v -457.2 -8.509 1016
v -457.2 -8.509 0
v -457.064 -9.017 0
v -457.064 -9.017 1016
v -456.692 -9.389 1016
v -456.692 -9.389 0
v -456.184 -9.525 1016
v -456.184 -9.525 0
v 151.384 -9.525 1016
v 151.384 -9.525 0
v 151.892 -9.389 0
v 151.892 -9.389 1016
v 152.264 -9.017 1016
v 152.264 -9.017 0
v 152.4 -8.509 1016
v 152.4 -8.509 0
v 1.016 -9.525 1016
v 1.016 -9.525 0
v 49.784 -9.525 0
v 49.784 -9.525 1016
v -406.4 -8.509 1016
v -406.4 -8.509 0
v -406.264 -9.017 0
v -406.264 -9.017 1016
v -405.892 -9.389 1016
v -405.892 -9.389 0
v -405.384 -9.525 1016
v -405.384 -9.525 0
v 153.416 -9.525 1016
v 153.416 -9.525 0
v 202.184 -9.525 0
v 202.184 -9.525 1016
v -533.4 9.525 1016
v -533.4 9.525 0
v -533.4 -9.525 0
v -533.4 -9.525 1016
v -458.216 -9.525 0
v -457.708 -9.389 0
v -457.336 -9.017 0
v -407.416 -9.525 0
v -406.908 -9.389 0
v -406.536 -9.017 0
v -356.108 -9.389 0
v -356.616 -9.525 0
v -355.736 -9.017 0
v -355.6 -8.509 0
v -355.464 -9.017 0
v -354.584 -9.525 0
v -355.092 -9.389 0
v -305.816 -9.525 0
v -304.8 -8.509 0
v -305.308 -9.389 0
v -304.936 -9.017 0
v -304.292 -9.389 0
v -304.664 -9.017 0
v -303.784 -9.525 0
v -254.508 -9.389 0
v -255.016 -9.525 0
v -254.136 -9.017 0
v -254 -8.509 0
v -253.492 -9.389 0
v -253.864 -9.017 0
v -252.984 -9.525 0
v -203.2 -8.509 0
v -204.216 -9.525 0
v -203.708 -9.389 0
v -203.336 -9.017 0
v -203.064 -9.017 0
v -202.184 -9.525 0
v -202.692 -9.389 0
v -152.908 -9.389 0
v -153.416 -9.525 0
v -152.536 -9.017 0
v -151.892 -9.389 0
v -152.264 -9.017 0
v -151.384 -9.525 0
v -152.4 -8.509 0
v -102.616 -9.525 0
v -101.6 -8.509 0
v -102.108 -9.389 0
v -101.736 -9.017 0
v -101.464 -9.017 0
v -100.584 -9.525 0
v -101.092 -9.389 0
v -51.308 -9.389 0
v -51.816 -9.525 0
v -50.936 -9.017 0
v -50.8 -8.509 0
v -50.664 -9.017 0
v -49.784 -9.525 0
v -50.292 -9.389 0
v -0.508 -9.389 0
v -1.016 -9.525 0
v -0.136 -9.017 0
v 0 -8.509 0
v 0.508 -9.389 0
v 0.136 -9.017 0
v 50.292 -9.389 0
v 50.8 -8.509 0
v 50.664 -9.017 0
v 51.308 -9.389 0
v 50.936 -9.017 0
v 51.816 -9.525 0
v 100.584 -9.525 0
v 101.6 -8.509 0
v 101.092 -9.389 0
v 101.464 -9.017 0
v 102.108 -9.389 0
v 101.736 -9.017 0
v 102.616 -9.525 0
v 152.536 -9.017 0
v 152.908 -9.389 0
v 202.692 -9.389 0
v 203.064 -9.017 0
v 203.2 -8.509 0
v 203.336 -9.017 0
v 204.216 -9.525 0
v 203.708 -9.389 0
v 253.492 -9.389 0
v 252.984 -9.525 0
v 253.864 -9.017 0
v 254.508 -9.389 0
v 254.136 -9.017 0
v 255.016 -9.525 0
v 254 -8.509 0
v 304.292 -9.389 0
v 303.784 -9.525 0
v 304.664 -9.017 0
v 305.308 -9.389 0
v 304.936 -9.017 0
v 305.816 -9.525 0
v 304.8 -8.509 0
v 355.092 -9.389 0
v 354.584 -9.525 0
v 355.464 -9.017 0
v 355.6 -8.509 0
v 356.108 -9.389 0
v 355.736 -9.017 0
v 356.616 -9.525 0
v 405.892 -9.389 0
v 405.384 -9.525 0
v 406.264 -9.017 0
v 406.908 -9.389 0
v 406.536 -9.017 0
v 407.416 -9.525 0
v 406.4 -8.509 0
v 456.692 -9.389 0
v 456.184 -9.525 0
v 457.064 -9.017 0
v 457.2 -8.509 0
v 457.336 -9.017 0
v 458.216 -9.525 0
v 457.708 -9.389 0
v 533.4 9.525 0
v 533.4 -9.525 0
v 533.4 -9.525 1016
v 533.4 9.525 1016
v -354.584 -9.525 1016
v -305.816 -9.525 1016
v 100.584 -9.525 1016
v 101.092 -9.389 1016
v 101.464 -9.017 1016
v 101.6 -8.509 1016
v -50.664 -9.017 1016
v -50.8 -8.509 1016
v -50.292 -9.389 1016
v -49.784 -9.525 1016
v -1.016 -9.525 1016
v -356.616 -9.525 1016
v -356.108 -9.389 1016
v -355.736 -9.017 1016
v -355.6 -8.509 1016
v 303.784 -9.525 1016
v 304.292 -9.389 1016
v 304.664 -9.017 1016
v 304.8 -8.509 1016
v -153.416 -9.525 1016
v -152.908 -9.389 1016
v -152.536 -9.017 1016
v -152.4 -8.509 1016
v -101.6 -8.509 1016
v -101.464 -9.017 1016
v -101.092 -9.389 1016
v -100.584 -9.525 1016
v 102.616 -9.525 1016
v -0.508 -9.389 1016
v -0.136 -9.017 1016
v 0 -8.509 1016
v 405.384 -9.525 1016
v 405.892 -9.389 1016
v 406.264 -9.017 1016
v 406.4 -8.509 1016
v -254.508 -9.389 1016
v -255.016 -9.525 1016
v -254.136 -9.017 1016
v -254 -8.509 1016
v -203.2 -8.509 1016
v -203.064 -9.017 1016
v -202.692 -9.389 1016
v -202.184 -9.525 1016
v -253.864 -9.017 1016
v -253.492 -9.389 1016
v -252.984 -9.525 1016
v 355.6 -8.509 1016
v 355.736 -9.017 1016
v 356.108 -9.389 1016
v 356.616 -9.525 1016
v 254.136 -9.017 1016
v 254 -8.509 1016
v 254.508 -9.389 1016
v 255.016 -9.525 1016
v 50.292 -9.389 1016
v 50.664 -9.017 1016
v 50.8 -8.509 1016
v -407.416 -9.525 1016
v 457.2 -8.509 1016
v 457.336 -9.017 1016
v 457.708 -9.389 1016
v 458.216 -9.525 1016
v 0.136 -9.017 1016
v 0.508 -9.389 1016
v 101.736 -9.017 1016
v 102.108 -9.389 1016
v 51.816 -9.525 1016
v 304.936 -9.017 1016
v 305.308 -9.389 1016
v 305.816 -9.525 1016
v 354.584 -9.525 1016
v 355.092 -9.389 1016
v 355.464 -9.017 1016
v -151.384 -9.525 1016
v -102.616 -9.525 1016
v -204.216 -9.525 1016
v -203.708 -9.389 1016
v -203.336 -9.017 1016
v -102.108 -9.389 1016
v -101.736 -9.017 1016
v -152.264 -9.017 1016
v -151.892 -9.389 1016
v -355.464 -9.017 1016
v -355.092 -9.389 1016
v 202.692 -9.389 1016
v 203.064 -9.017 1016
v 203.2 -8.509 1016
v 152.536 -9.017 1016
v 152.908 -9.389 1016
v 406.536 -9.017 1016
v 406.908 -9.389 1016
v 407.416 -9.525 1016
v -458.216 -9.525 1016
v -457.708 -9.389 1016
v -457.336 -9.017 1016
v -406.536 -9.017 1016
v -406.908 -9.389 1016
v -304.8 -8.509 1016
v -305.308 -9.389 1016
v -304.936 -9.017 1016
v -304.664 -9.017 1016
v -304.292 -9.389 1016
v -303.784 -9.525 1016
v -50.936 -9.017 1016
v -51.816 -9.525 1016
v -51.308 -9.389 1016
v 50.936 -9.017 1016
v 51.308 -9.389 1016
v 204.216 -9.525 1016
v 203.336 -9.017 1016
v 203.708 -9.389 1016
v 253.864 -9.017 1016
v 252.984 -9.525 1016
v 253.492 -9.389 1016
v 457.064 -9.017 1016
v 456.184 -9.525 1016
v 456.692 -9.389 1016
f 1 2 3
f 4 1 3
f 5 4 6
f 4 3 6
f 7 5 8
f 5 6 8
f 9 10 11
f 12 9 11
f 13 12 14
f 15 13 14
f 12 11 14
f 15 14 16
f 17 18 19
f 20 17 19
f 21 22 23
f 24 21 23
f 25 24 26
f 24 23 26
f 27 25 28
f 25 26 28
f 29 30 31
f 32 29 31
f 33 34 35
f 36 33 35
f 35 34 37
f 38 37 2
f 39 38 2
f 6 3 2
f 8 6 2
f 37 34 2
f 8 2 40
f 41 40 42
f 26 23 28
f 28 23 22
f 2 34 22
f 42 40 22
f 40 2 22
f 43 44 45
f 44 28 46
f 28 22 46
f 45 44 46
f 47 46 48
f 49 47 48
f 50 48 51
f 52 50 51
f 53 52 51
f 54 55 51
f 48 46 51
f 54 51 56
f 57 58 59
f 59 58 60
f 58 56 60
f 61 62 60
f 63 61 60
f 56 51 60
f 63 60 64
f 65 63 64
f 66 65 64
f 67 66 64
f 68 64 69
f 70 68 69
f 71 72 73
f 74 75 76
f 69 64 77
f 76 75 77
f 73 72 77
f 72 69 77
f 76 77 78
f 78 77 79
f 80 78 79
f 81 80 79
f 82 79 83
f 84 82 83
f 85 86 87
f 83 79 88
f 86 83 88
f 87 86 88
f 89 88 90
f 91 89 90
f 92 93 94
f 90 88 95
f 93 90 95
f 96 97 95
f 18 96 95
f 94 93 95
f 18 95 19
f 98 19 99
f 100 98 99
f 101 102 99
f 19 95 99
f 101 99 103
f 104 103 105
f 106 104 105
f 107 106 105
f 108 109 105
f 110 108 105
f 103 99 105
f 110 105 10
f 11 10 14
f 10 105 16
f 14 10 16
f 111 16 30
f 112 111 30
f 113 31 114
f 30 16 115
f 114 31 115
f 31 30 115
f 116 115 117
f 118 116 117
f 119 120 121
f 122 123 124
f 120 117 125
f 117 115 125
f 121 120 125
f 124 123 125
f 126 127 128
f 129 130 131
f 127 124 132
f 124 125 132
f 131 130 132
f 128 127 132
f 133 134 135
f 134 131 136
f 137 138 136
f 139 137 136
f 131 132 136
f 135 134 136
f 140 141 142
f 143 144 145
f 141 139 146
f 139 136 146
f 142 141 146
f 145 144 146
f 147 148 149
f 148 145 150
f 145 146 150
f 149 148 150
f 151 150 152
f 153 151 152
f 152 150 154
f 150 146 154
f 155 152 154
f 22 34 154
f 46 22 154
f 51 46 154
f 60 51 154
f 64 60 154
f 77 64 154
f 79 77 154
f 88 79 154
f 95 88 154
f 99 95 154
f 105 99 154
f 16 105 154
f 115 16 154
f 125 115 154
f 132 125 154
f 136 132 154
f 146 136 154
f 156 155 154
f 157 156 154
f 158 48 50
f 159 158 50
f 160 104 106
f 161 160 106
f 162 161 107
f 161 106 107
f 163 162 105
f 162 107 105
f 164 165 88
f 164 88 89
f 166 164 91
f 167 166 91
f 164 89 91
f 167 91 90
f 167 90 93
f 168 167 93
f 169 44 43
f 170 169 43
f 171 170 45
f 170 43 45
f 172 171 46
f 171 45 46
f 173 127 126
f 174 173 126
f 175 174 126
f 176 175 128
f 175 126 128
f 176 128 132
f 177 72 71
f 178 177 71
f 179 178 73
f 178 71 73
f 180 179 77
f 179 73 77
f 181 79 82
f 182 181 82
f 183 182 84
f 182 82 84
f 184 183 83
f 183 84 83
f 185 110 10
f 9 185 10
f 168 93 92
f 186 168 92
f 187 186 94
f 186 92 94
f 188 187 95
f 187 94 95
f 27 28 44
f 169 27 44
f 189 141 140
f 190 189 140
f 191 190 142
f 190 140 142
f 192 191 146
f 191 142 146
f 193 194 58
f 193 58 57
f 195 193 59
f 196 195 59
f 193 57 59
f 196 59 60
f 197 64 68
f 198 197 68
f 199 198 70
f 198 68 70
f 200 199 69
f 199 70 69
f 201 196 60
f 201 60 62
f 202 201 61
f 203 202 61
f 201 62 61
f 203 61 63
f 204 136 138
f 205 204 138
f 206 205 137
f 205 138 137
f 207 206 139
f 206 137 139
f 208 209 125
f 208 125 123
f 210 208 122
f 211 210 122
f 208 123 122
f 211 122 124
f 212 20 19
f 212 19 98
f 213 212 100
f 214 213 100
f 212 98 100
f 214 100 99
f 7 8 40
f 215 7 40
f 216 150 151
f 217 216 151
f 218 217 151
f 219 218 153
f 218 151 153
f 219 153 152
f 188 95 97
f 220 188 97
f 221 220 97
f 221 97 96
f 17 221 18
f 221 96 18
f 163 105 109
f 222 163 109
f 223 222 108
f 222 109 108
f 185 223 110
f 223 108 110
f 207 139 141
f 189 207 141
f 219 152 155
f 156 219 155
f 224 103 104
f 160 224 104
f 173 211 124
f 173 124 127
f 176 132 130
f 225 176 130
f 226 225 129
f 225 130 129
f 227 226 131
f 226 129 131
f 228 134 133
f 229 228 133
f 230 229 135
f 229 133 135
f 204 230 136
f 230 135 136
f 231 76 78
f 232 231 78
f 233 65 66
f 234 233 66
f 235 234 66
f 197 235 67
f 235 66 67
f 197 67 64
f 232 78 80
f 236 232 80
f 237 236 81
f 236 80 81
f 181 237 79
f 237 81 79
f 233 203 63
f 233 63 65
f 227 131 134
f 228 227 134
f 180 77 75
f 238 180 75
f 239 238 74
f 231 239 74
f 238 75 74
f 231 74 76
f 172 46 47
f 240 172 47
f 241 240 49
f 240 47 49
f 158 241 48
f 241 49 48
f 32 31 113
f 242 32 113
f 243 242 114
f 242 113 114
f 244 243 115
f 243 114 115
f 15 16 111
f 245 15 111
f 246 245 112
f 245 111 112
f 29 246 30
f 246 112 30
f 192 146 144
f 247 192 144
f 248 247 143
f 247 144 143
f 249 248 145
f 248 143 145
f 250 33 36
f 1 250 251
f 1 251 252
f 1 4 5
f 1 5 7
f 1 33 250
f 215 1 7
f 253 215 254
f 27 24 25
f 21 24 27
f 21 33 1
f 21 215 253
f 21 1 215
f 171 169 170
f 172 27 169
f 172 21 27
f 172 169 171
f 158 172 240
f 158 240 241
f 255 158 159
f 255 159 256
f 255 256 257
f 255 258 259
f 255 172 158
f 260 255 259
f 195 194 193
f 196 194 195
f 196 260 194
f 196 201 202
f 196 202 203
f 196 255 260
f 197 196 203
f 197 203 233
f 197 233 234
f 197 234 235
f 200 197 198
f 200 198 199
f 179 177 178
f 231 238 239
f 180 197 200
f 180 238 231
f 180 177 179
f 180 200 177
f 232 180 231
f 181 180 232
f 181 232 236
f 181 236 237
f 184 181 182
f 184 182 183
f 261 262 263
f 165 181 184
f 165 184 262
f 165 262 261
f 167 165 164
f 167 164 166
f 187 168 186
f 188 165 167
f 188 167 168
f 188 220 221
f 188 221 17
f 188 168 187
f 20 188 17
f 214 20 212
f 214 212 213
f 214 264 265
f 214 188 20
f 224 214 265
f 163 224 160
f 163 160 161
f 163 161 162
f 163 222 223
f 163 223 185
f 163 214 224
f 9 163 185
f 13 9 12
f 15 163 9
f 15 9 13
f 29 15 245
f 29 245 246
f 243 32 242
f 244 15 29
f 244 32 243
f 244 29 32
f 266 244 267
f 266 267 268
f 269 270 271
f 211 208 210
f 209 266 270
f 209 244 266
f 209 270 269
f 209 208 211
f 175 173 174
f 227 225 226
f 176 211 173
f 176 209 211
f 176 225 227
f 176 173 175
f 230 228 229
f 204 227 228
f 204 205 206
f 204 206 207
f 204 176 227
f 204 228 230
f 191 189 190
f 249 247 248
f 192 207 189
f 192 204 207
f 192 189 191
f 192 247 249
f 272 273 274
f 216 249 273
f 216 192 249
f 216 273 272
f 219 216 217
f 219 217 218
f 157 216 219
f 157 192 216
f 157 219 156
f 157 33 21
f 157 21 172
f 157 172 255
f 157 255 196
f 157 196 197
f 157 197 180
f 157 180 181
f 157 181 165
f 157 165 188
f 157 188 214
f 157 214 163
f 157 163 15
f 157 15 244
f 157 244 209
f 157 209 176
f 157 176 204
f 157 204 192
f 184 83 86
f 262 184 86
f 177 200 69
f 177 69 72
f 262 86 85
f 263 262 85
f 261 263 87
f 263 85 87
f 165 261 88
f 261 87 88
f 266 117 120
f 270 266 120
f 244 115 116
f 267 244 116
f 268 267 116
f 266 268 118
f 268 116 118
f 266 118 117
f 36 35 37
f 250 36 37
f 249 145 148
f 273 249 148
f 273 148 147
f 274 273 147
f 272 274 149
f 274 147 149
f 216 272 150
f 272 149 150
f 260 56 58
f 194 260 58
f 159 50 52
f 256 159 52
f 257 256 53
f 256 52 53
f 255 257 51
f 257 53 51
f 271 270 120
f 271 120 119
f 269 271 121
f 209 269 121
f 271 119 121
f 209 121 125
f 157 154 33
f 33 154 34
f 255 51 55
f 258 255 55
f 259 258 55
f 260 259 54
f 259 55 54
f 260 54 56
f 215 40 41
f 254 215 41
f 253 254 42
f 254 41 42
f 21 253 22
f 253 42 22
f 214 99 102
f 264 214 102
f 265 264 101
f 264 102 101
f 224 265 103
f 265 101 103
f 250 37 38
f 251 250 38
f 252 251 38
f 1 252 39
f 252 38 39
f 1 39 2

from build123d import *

# Parameters (mm, degrees)
F1_DEPTH = 1016


with BuildPart() as f1:
    # F0 (on Top) → F1 (new body)
    with BuildSketch(Plane.XY):
        with BuildLine():
            Line((509.016, -9.525), (533.4, -9.525))
            Line((533.4, -9.525), (533.4, 9.525))
            Line((533.4, 9.525), (-533.4, 9.525))
            Line((-533.4, 9.525), (-533.4, -9.525))
            Line((-533.4, -9.525), (-509.016, -9.525))
            ThreePointArc((-509.016, -9.525), (-508.29758, -9.22742), (-508, -8.509))
            ThreePointArc((-508, -8.509), (-507.70242, -9.22742), (-506.984, -9.525))
            Line((-506.984, -9.525), (-458.216, -9.525))
            ThreePointArc((-458.216, -9.525), (-457.49758, -9.22742), (-457.2, -8.509))
            ThreePointArc((-457.2, -8.509), (-456.90242, -9.22742), (-456.184, -9.525))
            Line((-456.184, -9.525), (-407.416, -9.525))
            ThreePointArc((-407.416, -9.525), (-406.69758, -9.22742), (-406.4, -8.509))
            ThreePointArc((-406.4, -8.509), (-406.10242, -9.22742), (-405.384, -9.525))
            Line((-405.384, -9.525), (-356.616, -9.525))
            ThreePointArc((-356.616, -9.525), (-355.89758, -9.22742), (-355.6, -8.509))
            ThreePointArc((-355.6, -8.509), (-355.30242, -9.22742), (-354.584, -9.525))
            Line((-354.584, -9.525), (-305.816, -9.525))
            ThreePointArc((-305.816, -9.525), (-305.09758, -9.22742), (-304.8, -8.509))
            ThreePointArc((-304.8, -8.509), (-304.50242, -9.22742), (-303.784, -9.525))
            Line((-303.784, -9.525), (-255.016, -9.525))
            ThreePointArc((-255.016, -9.525), (-254.29758, -9.22742), (-254, -8.509))
            ThreePointArc((-254, -8.509), (-253.70242, -9.22742), (-252.984, -9.525))
            Line((-252.984, -9.525), (-204.216, -9.525))
            ThreePointArc((-204.216, -9.525), (-203.49758, -9.22742), (-203.2, -8.509))
            ThreePointArc((-203.2, -8.509), (-202.90242, -9.22742), (-202.184, -9.525))
            Line((-202.184, -9.525), (-153.416, -9.525))
            ThreePointArc((-153.416, -9.525), (-152.69758, -9.22742), (-152.4, -8.509))
            ThreePointArc((-152.4, -8.509), (-152.10242, -9.22742), (-151.384, -9.525))
            Line((-151.384, -9.525), (-102.616, -9.525))
            ThreePointArc((-102.616, -9.525), (-101.89758, -9.22742), (-101.6, -8.509))
            ThreePointArc((-101.6, -8.509), (-101.30242, -9.22742), (-100.584, -9.525))
            Line((-100.584, -9.525), (-51.816, -9.525))
            ThreePointArc((-51.816, -9.525), (-51.09758, -9.22742), (-50.8, -8.509))
            ThreePointArc((-50.8, -8.509), (-50.50242, -9.22742), (-49.784, -9.525))
            Line((-49.784, -9.525), (-1.016, -9.525))
            ThreePointArc((-1.016, -9.525), (-0.29758, -9.22742), (0, -8.509))
            ThreePointArc((0, -8.509), (0.29758, -9.22742), (1.016, -9.525))
            Line((1.016, -9.525), (49.784, -9.525))
            ThreePointArc((49.784, -9.525), (50.50242, -9.22742), (50.8, -8.509))
            ThreePointArc((50.8, -8.509), (51.09758, -9.22742), (51.816, -9.525))
            Line((51.816, -9.525), (100.584, -9.525))
            ThreePointArc((100.584, -9.525), (101.30242, -9.22742), (101.6, -8.509))
            ThreePointArc((101.6, -8.509), (101.89758, -9.22742), (102.616, -9.525))
            Line((102.616, -9.525), (151.384, -9.525))
            ThreePointArc((151.384, -9.525), (152.10242, -9.22742), (152.4, -8.509))
            ThreePointArc((152.4, -8.509), (152.69758, -9.22742), (153.416, -9.525))
            Line((153.416, -9.525), (202.184, -9.525))
            ThreePointArc((202.184, -9.525), (202.90242, -9.22742), (203.2, -8.509))
            ThreePointArc((203.2, -8.509), (203.49758, -9.22742), (204.216, -9.525))
            Line((204.216, -9.525), (252.984, -9.525))
            ThreePointArc((252.984, -9.525), (253.70242, -9.22742), (254, -8.509))
            ThreePointArc((254, -8.509), (254.29758, -9.22742), (255.016, -9.525))
            Line((255.016, -9.525), (303.784, -9.525))
            ThreePointArc((303.784, -9.525), (304.50242, -9.22742), (304.8, -8.509))
            ThreePointArc((304.8, -8.509), (305.09758, -9.22742), (305.816, -9.525))
            Line((305.816, -9.525), (354.584, -9.525))
            ThreePointArc((354.584, -9.525), (355.30242, -9.22742), (355.6, -8.509))
            ThreePointArc((355.6, -8.509), (355.89758, -9.22742), (356.616, -9.525))
            Line((356.616, -9.525), (405.384, -9.525))
            ThreePointArc((405.384, -9.525), (406.10242, -9.22742), (406.4, -8.509))
            ThreePointArc((406.4, -8.509), (406.69758, -9.22742), (407.416, -9.525))
            Line((407.416, -9.525), (456.184, -9.525))
            ThreePointArc((456.184, -9.525), (456.90242, -9.22742), (457.2, -8.509))
            ThreePointArc((457.2, -8.509), (457.49758, -9.22742), (458.216, -9.525))
            Line((458.216, -9.525), (506.984, -9.525))
            ThreePointArc((506.984, -9.525), (507.70242, -9.22742), (508, -8.509))
            ThreePointArc((508, -8.509), (508.29758, -9.22742), (509.016, -9.525))
        make_face()
        with BuildLine():
            Line((506.984, -9.525), (509.016, -9.525))
            ThreePointArc((509.016, -9.525), (508.29758, -9.22742), (508, -8.509))
            ThreePointArc((508, -8.509), (507.70242, -9.22742), (506.984, -9.525))
        make_face()
        with BuildLine():
            ThreePointArc((-508, -8.509), (-508.29758, -9.22742), (-509.016, -9.525))
            Line((-509.016, -9.525), (-506.984, -9.525))
            ThreePointArc((-506.984, -9.525), (-507.70242, -9.22742), (-508, -8.509))
        make_face()
    extrude(amount=F1_DEPTH)


solid = f1.part
